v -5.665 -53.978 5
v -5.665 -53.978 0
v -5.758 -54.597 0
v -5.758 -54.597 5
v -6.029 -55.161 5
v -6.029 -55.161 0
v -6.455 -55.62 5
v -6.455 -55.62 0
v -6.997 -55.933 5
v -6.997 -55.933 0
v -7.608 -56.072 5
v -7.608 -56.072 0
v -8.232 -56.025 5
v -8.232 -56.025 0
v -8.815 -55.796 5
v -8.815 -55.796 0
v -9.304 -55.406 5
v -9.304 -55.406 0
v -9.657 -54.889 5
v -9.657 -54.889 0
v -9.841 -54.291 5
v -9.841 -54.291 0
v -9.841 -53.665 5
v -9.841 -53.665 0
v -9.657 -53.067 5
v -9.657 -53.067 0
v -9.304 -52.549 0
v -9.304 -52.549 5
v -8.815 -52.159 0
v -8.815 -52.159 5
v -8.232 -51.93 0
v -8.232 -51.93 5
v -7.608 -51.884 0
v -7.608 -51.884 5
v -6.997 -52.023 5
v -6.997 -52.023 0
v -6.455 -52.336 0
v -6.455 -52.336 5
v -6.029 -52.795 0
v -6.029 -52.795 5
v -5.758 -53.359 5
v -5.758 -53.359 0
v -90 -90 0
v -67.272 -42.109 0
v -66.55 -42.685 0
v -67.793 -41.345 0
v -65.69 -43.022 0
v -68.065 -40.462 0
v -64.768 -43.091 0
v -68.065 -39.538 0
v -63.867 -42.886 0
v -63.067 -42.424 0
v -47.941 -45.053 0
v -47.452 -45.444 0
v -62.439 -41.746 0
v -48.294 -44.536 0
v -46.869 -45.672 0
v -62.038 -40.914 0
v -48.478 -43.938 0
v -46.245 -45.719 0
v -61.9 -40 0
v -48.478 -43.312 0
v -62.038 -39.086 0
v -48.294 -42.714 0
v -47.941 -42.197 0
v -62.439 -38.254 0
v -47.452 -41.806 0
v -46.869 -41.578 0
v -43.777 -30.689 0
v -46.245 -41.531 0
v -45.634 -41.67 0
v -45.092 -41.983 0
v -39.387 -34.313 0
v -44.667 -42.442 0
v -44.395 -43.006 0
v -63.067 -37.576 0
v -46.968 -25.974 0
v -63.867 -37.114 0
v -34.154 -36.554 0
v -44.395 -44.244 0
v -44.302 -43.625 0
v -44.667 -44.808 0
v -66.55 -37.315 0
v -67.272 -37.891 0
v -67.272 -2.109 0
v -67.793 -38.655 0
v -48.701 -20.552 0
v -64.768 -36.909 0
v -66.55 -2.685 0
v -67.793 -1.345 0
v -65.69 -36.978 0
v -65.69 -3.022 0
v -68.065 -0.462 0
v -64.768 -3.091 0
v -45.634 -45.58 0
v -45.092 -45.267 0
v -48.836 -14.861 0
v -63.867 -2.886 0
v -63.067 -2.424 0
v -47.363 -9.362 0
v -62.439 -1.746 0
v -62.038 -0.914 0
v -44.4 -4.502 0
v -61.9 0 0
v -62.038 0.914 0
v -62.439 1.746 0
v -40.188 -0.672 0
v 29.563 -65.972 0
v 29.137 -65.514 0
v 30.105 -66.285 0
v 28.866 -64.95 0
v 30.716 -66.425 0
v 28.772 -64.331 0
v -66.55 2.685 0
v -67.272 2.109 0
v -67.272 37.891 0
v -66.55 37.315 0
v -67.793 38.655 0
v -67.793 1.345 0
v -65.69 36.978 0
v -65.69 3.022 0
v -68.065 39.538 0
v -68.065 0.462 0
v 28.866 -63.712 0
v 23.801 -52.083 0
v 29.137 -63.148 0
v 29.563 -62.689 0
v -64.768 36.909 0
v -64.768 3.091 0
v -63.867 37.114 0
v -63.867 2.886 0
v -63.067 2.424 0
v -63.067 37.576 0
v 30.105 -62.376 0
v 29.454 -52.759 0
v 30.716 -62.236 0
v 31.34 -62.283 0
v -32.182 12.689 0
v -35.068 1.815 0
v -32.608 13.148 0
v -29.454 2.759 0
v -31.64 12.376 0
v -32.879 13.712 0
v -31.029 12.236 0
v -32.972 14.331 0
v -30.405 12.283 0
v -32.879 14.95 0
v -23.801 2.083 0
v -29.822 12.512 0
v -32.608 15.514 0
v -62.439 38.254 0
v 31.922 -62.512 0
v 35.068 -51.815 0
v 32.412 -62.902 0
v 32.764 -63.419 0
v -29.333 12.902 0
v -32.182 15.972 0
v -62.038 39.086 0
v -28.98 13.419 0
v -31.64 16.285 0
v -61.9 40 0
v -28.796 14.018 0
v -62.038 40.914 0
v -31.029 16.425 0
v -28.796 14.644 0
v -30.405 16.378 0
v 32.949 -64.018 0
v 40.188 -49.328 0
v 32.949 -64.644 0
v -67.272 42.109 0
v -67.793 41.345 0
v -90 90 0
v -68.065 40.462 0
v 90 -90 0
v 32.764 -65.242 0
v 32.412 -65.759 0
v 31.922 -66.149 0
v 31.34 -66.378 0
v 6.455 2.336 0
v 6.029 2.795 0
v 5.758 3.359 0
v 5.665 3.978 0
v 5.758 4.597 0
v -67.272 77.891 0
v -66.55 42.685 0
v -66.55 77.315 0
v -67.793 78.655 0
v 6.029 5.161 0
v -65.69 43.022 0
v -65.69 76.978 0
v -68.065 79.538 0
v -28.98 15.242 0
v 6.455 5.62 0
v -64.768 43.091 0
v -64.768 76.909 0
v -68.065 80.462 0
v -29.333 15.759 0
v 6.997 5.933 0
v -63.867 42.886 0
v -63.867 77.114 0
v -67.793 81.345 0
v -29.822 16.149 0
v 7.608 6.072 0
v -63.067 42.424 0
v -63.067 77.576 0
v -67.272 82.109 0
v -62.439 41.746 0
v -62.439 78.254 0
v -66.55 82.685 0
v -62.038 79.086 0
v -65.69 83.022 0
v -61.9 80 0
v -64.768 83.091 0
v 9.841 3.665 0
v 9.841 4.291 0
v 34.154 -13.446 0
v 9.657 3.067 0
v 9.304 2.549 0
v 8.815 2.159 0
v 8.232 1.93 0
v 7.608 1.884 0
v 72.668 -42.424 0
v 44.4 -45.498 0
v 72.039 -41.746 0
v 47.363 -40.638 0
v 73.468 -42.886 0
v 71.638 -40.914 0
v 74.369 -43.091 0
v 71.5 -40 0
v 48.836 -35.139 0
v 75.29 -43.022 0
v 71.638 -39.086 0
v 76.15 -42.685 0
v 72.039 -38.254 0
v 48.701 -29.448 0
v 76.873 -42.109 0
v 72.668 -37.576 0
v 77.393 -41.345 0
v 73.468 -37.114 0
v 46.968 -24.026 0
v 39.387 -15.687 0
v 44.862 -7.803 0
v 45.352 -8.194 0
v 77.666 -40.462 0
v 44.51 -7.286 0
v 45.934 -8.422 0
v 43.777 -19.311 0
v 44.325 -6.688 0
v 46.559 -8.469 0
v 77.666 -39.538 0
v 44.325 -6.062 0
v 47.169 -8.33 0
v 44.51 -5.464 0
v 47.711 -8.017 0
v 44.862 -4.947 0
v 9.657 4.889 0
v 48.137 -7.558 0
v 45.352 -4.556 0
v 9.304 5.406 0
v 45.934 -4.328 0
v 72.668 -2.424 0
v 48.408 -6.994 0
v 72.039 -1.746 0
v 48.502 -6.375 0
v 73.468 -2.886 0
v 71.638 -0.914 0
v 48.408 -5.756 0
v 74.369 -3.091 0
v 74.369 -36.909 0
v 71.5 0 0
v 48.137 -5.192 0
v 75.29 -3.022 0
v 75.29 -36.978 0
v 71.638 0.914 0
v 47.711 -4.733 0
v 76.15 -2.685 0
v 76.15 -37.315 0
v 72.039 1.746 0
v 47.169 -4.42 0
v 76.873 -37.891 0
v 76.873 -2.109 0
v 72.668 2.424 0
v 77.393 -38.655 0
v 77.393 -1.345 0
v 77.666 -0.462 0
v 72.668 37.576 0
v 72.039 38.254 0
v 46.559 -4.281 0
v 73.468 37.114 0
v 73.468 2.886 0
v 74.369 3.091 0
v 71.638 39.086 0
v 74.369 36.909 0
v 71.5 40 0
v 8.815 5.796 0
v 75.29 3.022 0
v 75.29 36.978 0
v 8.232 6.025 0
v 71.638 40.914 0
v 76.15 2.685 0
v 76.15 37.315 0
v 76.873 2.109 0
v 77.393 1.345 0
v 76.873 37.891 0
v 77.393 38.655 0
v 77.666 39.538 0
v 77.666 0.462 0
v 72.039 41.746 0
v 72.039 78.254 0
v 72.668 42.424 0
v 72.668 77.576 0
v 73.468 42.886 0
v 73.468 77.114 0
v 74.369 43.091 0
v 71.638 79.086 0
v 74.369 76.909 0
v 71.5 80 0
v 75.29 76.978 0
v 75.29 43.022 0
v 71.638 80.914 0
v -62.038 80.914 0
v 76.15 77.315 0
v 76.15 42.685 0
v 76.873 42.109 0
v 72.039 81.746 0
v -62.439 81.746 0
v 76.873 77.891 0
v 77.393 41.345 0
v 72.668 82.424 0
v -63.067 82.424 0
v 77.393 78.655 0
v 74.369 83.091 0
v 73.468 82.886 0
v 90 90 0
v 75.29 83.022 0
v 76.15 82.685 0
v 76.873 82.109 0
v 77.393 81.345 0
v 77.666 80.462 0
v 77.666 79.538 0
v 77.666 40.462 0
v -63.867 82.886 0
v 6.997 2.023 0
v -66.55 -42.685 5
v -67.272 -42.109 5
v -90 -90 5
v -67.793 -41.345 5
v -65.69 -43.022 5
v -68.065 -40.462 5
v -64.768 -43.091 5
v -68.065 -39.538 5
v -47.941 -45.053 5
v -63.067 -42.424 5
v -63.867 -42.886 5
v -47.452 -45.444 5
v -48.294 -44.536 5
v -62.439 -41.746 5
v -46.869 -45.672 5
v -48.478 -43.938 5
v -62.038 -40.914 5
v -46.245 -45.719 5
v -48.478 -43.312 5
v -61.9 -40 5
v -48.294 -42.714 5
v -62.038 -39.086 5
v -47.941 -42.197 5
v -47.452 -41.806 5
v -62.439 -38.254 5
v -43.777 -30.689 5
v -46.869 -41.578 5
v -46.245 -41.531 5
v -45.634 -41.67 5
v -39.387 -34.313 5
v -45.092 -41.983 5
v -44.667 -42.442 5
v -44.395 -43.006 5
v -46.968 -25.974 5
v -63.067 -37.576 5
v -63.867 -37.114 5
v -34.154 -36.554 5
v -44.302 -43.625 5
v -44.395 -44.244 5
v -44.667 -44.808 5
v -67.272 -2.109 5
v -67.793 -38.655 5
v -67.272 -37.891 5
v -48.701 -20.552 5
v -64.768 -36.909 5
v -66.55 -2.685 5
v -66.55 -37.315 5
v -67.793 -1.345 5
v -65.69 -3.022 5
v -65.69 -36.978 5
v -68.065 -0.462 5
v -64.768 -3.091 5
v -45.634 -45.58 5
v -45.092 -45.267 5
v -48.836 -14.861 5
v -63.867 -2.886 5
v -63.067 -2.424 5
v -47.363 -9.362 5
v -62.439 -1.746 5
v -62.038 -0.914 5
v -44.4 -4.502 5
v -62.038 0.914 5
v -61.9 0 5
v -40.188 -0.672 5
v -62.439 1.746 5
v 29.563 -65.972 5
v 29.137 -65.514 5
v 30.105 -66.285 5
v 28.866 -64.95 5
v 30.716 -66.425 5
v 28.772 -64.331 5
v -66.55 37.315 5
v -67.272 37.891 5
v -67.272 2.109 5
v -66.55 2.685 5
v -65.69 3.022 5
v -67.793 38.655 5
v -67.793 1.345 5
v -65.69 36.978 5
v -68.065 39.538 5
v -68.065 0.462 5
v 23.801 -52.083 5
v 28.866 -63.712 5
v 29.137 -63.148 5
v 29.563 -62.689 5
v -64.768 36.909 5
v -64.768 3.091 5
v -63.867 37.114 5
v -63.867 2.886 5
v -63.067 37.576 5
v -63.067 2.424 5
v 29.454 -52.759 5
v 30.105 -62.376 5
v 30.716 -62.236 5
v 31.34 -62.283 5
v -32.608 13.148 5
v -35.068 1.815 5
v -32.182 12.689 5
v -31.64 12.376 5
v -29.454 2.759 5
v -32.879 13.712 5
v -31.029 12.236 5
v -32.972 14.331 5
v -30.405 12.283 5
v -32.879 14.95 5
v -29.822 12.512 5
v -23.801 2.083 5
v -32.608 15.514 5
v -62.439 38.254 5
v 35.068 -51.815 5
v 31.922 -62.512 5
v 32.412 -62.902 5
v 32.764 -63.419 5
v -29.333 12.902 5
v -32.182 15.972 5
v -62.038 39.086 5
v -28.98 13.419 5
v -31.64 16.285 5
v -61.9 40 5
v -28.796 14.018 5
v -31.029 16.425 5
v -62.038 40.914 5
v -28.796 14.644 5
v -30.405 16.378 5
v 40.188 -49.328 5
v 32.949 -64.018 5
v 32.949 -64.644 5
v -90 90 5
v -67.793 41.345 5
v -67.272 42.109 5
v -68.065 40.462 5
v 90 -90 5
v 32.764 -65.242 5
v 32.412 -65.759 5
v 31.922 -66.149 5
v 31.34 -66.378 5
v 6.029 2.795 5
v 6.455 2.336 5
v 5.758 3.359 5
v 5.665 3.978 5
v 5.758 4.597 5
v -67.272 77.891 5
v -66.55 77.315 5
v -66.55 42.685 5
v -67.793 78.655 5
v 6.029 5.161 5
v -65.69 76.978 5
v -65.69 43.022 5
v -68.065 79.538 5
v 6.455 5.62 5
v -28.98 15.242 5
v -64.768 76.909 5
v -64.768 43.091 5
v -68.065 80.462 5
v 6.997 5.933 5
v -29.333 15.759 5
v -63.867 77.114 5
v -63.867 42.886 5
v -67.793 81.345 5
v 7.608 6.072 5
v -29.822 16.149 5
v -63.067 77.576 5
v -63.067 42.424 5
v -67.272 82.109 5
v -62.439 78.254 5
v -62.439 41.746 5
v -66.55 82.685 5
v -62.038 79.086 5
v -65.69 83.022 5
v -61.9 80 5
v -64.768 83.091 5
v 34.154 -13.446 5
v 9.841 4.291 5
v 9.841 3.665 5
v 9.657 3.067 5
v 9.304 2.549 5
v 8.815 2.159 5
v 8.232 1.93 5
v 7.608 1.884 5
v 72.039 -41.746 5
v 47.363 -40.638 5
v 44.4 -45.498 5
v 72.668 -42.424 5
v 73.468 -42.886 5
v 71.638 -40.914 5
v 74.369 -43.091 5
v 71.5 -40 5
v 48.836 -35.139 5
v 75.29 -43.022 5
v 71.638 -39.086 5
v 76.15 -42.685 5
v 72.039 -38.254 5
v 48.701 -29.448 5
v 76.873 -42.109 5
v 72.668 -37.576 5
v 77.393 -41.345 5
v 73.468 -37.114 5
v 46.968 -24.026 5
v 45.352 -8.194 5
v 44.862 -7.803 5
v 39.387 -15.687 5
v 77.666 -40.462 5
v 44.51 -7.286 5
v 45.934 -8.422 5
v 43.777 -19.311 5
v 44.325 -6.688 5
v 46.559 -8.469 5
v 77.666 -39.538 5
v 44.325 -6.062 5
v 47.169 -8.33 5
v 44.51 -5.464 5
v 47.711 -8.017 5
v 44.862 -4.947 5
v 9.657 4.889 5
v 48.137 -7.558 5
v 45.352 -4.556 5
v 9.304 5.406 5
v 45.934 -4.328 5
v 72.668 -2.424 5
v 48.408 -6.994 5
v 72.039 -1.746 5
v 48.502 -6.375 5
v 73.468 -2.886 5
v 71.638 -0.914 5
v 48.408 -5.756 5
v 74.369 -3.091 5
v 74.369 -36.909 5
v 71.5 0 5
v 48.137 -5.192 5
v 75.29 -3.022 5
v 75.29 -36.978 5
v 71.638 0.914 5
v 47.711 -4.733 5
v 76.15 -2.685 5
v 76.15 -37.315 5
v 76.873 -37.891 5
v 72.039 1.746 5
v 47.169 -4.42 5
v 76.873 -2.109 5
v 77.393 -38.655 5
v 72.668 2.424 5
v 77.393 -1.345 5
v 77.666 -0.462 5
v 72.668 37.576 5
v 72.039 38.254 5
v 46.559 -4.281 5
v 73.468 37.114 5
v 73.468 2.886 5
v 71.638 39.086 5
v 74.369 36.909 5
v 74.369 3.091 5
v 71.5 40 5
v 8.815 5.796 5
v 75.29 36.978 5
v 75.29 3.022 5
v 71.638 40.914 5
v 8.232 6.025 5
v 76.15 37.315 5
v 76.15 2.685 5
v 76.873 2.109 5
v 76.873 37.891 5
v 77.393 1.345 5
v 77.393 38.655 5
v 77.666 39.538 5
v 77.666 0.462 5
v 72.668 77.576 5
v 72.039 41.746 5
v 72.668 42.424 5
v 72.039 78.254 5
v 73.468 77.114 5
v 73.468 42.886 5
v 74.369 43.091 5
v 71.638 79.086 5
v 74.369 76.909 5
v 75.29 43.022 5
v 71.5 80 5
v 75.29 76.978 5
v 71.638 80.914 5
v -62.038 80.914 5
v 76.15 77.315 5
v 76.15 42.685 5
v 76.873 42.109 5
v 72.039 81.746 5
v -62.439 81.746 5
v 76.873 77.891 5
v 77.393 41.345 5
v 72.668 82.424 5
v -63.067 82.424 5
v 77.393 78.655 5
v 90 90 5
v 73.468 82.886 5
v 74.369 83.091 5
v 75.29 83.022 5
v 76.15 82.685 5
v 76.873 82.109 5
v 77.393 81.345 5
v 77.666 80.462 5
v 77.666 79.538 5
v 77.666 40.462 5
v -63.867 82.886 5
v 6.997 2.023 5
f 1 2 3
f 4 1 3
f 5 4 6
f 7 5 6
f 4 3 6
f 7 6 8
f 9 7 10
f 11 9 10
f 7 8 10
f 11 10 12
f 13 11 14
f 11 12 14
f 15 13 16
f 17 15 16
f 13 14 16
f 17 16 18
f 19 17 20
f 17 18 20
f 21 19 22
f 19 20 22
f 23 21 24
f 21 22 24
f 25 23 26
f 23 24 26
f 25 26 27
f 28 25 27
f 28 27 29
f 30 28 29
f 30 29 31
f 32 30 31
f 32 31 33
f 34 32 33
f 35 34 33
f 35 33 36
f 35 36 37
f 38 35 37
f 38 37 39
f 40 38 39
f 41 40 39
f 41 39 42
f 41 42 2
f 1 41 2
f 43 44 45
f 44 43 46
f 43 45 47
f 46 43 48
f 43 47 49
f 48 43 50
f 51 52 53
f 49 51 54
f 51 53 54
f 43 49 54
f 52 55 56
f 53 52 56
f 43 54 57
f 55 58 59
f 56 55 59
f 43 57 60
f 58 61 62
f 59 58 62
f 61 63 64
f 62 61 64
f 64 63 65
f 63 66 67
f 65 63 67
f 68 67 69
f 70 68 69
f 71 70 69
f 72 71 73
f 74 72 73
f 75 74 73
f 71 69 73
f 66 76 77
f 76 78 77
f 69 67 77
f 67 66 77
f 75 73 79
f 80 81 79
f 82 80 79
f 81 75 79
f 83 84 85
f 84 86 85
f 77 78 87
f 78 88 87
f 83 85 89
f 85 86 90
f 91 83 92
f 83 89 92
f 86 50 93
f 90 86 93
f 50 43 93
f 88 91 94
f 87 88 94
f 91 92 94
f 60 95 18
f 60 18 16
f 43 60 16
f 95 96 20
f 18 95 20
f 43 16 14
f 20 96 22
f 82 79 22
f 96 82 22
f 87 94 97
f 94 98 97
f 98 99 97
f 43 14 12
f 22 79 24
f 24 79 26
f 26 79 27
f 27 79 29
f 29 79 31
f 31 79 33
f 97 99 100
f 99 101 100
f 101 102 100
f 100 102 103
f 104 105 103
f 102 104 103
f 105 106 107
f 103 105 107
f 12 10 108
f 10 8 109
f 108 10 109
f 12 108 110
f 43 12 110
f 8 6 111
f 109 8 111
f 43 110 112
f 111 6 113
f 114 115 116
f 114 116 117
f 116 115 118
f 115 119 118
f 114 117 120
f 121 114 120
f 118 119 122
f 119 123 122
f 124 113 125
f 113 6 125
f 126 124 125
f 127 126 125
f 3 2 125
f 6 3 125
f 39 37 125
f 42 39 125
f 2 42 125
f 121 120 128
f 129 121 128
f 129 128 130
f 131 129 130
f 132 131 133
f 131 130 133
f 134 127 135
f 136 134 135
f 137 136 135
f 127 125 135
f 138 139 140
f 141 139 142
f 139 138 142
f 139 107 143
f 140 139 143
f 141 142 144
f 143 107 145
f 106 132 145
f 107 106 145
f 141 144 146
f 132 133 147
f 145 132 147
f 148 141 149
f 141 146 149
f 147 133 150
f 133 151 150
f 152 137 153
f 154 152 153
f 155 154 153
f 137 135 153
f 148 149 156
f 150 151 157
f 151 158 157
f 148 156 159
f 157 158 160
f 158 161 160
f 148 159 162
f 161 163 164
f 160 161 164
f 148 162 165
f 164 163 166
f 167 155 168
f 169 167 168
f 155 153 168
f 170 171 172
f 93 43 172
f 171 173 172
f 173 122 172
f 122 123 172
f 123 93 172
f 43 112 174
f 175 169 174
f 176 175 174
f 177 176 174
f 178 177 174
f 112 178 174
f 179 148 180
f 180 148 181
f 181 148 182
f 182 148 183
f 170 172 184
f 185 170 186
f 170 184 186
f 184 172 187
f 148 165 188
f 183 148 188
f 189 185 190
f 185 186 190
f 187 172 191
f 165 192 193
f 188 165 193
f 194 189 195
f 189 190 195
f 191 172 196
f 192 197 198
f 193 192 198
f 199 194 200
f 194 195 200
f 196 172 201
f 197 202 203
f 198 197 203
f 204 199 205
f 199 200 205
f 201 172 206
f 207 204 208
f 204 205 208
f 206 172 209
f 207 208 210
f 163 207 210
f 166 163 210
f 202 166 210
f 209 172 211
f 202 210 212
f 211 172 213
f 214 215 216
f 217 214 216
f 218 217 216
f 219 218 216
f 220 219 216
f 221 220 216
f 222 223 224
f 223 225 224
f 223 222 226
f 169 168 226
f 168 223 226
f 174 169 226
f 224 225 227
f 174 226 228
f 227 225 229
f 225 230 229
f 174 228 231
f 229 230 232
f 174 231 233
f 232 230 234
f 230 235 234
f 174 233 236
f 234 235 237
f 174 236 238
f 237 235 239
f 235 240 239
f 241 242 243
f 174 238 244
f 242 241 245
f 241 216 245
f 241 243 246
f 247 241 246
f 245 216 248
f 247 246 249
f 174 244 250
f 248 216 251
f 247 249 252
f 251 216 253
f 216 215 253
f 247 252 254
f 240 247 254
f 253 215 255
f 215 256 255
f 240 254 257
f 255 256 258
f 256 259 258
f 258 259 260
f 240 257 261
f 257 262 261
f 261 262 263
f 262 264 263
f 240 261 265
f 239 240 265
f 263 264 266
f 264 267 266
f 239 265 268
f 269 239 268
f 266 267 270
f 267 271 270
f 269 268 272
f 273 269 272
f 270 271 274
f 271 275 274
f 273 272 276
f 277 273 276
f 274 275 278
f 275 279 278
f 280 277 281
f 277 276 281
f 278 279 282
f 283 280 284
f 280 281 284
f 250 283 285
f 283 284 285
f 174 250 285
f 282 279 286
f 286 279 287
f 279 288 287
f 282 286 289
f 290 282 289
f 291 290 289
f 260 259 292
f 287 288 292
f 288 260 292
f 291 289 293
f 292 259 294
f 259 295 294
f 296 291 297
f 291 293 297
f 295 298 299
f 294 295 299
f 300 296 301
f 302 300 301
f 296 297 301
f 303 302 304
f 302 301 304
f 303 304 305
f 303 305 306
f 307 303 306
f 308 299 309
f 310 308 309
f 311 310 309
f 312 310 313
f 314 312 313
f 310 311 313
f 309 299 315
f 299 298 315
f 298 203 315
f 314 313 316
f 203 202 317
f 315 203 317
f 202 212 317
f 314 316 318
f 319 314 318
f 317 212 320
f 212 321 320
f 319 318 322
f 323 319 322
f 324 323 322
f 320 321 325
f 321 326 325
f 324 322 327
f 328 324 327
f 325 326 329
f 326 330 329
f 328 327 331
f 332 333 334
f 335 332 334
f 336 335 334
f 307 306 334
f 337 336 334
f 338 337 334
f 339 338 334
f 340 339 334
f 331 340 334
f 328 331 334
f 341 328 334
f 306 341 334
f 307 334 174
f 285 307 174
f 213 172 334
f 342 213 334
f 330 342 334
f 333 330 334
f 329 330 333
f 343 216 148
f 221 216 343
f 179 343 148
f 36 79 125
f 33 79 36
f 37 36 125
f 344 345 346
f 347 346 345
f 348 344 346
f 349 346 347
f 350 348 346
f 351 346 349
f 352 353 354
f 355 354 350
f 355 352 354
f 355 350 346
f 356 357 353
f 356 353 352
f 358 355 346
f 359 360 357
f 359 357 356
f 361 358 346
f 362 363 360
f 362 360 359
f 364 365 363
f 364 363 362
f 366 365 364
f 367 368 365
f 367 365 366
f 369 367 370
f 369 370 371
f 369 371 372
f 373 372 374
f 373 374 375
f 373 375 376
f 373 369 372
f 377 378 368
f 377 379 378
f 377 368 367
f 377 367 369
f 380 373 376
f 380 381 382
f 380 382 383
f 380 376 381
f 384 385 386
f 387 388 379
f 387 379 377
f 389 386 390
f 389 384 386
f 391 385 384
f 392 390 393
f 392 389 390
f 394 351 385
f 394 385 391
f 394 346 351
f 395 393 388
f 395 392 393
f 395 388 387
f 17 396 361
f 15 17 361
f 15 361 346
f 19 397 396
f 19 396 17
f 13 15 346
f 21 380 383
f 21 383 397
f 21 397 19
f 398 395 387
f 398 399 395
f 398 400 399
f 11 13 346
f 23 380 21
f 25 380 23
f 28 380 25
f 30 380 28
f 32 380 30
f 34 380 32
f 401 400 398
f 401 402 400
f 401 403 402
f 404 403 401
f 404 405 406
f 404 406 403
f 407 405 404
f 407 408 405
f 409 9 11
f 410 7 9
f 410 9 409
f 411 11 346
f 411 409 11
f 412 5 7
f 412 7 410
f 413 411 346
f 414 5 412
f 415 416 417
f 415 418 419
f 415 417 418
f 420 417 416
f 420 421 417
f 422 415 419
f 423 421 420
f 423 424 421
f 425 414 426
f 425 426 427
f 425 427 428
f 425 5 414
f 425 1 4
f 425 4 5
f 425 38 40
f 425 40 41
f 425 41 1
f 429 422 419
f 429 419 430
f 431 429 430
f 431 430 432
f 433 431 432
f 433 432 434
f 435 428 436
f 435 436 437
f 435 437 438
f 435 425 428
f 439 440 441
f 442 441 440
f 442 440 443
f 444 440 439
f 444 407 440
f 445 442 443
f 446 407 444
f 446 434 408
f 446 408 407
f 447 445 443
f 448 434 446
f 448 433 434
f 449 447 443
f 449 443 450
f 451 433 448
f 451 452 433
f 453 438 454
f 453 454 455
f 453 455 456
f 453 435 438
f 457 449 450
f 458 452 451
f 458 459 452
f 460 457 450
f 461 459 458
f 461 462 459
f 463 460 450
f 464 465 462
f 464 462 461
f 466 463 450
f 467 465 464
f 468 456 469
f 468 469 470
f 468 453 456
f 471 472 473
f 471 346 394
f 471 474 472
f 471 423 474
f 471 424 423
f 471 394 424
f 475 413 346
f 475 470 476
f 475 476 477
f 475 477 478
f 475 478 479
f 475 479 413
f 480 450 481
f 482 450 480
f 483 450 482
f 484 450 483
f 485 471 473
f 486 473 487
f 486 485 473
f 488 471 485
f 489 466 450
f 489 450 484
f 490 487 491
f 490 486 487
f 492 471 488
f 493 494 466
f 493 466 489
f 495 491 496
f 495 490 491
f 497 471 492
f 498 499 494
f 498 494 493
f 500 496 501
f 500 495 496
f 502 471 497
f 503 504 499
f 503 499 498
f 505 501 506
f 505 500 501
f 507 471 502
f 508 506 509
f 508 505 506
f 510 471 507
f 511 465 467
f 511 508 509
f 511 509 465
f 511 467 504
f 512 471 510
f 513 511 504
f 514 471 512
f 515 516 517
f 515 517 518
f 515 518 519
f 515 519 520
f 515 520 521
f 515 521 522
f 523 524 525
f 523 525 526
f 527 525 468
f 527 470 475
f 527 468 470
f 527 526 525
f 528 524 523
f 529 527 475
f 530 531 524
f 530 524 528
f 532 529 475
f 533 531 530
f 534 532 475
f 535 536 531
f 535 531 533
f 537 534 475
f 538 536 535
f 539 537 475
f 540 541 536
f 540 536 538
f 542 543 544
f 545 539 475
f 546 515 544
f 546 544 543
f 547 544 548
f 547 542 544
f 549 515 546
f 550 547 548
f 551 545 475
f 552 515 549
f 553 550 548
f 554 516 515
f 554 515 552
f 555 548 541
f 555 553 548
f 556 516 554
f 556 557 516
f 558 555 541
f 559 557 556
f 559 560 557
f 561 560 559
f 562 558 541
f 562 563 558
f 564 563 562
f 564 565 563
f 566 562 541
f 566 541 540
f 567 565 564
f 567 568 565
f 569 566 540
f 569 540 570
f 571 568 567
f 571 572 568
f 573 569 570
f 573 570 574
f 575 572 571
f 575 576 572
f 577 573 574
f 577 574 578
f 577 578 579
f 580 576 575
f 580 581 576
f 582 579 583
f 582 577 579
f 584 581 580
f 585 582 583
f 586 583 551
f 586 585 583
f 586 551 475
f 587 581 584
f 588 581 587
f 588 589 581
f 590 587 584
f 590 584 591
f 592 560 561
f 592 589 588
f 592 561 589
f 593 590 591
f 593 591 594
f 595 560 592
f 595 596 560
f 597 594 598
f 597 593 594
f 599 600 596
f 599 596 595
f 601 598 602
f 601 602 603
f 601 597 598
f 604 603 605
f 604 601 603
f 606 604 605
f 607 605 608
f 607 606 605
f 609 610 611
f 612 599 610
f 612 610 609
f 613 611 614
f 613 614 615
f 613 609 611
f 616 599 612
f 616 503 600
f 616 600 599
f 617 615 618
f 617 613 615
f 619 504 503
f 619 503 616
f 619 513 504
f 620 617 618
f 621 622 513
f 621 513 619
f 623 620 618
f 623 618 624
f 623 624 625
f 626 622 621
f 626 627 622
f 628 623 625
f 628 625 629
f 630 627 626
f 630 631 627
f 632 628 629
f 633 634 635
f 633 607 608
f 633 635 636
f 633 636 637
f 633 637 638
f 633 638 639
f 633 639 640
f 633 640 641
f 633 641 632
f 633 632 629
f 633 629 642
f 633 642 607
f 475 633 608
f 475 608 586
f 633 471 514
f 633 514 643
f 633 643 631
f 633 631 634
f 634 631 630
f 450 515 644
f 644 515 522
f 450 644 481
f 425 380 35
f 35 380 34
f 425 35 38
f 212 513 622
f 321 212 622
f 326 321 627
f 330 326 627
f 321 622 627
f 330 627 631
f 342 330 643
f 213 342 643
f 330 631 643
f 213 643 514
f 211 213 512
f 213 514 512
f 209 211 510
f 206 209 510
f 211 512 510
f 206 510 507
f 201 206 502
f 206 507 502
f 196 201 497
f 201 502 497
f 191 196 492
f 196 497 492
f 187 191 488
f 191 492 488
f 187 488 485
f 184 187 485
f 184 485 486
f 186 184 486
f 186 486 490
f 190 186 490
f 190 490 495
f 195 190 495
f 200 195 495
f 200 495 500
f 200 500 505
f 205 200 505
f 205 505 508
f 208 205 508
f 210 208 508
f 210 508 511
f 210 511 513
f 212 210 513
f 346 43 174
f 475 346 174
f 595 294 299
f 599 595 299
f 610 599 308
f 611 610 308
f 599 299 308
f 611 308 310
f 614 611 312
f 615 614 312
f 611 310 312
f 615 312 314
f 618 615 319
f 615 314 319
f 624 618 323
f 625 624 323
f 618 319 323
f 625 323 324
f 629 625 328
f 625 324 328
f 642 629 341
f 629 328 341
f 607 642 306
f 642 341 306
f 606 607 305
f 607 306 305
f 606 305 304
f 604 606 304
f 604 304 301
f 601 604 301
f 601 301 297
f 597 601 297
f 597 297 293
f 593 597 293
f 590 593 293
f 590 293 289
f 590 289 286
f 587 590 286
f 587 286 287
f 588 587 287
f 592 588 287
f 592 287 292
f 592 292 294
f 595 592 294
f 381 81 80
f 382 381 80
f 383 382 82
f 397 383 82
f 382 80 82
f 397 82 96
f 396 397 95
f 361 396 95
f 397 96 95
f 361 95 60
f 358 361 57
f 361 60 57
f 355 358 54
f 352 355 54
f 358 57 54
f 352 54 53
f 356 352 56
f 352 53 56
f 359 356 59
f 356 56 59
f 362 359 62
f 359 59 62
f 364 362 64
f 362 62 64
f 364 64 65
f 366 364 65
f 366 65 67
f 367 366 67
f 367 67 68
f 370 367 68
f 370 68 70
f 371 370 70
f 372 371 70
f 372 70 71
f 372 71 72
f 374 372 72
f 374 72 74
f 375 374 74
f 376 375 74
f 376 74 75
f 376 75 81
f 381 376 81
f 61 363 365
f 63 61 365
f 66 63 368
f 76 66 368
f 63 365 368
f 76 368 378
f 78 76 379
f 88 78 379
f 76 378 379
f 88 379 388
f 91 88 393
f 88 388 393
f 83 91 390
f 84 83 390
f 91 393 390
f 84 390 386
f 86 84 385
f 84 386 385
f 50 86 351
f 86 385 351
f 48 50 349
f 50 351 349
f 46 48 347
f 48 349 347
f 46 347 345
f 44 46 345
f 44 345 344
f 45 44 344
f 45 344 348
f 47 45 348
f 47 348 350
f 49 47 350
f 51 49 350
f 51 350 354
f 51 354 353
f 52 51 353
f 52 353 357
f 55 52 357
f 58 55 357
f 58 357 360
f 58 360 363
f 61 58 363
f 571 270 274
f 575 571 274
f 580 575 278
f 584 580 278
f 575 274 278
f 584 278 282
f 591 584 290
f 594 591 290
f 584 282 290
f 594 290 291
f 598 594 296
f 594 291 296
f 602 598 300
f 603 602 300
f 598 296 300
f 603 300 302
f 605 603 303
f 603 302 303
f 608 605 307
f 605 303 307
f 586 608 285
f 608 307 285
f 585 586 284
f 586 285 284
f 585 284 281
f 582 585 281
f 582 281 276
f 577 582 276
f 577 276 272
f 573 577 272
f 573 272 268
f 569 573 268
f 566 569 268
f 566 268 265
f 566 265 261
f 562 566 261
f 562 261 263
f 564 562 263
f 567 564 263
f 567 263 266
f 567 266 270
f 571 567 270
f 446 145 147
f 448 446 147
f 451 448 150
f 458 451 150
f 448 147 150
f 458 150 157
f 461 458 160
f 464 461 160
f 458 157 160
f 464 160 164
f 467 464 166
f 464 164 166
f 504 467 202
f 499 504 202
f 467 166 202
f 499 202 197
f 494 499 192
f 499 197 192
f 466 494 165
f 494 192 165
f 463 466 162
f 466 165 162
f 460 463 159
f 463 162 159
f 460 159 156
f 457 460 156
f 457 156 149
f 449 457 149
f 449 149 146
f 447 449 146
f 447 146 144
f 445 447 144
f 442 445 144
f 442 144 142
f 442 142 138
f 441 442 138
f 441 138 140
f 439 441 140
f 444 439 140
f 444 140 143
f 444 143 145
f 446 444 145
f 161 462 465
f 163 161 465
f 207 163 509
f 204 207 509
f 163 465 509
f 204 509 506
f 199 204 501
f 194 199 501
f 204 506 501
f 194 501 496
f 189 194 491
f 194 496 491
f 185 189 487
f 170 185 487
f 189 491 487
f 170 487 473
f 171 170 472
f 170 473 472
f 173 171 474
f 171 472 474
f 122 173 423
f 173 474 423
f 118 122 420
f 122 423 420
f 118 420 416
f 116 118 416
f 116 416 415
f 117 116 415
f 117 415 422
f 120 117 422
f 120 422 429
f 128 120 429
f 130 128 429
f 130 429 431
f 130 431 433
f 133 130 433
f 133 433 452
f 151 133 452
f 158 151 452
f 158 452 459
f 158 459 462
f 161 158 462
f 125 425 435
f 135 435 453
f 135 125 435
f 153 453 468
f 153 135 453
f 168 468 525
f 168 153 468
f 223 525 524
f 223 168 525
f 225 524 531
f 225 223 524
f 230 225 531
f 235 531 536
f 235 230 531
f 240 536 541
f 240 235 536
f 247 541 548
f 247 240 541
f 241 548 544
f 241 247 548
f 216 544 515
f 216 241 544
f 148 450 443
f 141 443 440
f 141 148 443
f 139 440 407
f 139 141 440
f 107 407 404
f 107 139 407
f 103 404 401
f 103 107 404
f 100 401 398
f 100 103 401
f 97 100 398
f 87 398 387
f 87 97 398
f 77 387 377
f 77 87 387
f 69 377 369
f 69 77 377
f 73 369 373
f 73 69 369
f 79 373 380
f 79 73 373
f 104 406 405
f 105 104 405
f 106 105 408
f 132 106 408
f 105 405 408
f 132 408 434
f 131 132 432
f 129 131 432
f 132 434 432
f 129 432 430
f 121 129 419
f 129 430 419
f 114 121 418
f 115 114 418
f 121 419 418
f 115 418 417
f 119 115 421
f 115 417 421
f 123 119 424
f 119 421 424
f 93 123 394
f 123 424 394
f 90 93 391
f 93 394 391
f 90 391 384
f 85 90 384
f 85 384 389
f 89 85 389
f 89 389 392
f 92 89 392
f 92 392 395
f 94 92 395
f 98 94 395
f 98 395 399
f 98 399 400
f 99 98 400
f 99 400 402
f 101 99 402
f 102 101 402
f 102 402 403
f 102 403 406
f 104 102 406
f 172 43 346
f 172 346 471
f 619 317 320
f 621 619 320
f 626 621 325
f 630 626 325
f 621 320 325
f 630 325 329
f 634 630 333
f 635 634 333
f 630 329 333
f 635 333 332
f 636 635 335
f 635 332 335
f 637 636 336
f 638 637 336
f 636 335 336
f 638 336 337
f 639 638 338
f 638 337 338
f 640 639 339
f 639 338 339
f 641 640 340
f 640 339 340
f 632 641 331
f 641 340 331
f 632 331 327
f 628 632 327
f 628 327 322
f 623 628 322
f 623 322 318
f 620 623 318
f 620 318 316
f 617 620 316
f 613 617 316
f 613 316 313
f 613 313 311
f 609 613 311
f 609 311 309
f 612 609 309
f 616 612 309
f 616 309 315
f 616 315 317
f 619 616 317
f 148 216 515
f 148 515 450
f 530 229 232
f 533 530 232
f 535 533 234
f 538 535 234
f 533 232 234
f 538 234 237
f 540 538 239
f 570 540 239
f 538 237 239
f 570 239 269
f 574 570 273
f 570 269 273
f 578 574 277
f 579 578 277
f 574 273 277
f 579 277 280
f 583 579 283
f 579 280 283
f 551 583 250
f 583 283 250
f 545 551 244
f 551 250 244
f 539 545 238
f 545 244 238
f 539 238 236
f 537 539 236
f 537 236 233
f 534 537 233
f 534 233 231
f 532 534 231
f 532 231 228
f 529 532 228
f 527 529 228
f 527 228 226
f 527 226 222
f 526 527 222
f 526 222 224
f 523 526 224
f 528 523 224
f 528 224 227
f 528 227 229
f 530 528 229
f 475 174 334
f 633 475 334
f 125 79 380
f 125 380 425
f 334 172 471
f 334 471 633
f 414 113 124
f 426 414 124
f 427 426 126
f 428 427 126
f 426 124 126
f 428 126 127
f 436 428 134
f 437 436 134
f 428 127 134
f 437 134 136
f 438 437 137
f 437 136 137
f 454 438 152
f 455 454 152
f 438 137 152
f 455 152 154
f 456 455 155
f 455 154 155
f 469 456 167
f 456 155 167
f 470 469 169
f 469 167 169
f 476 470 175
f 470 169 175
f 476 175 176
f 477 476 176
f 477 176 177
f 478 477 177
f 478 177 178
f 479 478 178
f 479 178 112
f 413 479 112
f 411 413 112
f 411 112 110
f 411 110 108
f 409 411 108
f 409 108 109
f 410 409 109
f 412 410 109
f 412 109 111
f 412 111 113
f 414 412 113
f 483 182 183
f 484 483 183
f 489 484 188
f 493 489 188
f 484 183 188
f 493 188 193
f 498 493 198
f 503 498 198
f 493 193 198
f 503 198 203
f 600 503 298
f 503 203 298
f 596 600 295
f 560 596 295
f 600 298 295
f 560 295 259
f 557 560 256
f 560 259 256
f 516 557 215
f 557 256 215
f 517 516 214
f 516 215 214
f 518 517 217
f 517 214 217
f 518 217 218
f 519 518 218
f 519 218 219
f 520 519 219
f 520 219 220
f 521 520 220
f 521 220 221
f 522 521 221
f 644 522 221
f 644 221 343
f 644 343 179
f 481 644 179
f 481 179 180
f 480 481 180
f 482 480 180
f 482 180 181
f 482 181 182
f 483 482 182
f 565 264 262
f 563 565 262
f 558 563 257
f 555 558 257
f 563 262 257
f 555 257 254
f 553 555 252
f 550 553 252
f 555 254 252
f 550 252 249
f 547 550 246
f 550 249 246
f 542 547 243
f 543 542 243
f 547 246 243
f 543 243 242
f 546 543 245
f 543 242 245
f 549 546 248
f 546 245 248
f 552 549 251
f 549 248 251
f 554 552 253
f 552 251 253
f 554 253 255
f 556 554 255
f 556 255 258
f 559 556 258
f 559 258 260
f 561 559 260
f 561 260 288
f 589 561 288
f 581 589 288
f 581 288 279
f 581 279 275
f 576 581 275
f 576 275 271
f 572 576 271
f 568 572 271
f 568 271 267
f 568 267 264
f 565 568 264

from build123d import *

# Parameters (mm, degrees)
SKETCH1_W           = 180
SKETCH1_H           = 180
BOSS_EXTRUDE1_DEPTH = 5
CUT_EXTRUDE1_DEPTH  = 128.377392029
SKETCH4_R           = 3.1
CUT_EXTRUDE2_DEPTH  = 128.377392029
SKETCH5_R           = 3.1
CUT_EXTRUDE3_DEPTH  = 128.377392029
SKETCH6_R           = 2.1
CUT_EXTRUDE4_DEPTH  = 128.377392029


with BuildPart() as part:
    # Sketch1 → Boss-Extrude1 (new body)
    with BuildSketch(Plane.XY):
        Rectangle(SKETCH1_W, SKETCH1_H)
    extrude(amount=BOSS_EXTRUDE1_DEPTH)

    # Sketch3 → Cut-Extrude1 (cut, through all)
    with BuildSketch(Plane(origin=(0, 0, 0), x_dir=(-1, 0, 0), z_dir=(0, 0, -1))):
        with BuildLine():
            Line((-34.154155691, -13.446054827), (23.801393887, 2.083087879))
            ThreePointArc((23.801393887, 2.083087879), (48.296291314, -12.059047745), (34.154155691, -36.553945173))
            Line((34.154155691, -36.553945173), (-23.801393887, -52.083087879))
            ThreePointArc((-23.801393887, -52.083087879), (-48.296291314, -37.940952255), (-34.154155691, -13.446054827))
        make_face()
    extrude(amount=-CUT_EXTRUDE1_DEPTH, mode=Mode.SUBTRACT)

    # Sketch4 → Cut-Extrude2 (cut, through all)
    with BuildSketch(Plane.XY.offset(5)):
        with Locations((-65, 80)):
            Circle(SKETCH4_R)
        with Locations((-65, 40)):
            Circle(SKETCH4_R)
        with Locations((-65, 0)):
            Circle(SKETCH4_R)
        with Locations((-65, -40)):
            Circle(SKETCH4_R)
    extrude(amount=-CUT_EXTRUDE2_DEPTH, mode=Mode.SUBTRACT)

    # Sketch5 → Cut-Extrude3 (cut, through all)
    with BuildSketch(Plane(origin=(0, 0, 0), x_dir=(-1, 0, 0), z_dir=(0, 0, -1))):
        with Locations((-74.600409008, 80)):
            Circle(SKETCH5_R)
        with Locations((-74.600409008, 40)):
            Circle(SKETCH5_R)
        with Locations((-74.600409008, 0)):
            Circle(SKETCH5_R)
        with Locations((-74.600409008, -40)):
            Circle(SKETCH5_R)
    extrude(amount=-CUT_EXTRUDE3_DEPTH, mode=Mode.SUBTRACT)

    # Sketch6 → Cut-Extrude4 (cut, through all)
    with BuildSketch(Plane(origin=(0, 0, 0), x_dir=(-1, 0, 0), z_dir=(0, 0, -1))):
        with Locations((-7.764571353, 3.977774789)):
            Circle(SKETCH6_R)
        with Locations(Location((7.764571353, -53.977774789, 0), (0, 0, 180))):
            Circle(SKETCH6_R)
        with Locations(Location((46.401604405, -43.625012985, 0), (0, 0, 180))):
            Circle(SKETCH6_R)
        with Locations((30.872461698, 14.330536593)):
            Circle(SKETCH6_R)
        with Locations((-30.872461698, -64.330536593)):
            Circle(SKETCH6_R)
        with Locations(Location((-46.401604405, -6.374987015, 0), (0, 0, 180))):
            Circle(SKETCH6_R)
    extrude(amount=-CUT_EXTRUDE4_DEPTH, mode=Mode.SUBTRACT)


solid = part.part
